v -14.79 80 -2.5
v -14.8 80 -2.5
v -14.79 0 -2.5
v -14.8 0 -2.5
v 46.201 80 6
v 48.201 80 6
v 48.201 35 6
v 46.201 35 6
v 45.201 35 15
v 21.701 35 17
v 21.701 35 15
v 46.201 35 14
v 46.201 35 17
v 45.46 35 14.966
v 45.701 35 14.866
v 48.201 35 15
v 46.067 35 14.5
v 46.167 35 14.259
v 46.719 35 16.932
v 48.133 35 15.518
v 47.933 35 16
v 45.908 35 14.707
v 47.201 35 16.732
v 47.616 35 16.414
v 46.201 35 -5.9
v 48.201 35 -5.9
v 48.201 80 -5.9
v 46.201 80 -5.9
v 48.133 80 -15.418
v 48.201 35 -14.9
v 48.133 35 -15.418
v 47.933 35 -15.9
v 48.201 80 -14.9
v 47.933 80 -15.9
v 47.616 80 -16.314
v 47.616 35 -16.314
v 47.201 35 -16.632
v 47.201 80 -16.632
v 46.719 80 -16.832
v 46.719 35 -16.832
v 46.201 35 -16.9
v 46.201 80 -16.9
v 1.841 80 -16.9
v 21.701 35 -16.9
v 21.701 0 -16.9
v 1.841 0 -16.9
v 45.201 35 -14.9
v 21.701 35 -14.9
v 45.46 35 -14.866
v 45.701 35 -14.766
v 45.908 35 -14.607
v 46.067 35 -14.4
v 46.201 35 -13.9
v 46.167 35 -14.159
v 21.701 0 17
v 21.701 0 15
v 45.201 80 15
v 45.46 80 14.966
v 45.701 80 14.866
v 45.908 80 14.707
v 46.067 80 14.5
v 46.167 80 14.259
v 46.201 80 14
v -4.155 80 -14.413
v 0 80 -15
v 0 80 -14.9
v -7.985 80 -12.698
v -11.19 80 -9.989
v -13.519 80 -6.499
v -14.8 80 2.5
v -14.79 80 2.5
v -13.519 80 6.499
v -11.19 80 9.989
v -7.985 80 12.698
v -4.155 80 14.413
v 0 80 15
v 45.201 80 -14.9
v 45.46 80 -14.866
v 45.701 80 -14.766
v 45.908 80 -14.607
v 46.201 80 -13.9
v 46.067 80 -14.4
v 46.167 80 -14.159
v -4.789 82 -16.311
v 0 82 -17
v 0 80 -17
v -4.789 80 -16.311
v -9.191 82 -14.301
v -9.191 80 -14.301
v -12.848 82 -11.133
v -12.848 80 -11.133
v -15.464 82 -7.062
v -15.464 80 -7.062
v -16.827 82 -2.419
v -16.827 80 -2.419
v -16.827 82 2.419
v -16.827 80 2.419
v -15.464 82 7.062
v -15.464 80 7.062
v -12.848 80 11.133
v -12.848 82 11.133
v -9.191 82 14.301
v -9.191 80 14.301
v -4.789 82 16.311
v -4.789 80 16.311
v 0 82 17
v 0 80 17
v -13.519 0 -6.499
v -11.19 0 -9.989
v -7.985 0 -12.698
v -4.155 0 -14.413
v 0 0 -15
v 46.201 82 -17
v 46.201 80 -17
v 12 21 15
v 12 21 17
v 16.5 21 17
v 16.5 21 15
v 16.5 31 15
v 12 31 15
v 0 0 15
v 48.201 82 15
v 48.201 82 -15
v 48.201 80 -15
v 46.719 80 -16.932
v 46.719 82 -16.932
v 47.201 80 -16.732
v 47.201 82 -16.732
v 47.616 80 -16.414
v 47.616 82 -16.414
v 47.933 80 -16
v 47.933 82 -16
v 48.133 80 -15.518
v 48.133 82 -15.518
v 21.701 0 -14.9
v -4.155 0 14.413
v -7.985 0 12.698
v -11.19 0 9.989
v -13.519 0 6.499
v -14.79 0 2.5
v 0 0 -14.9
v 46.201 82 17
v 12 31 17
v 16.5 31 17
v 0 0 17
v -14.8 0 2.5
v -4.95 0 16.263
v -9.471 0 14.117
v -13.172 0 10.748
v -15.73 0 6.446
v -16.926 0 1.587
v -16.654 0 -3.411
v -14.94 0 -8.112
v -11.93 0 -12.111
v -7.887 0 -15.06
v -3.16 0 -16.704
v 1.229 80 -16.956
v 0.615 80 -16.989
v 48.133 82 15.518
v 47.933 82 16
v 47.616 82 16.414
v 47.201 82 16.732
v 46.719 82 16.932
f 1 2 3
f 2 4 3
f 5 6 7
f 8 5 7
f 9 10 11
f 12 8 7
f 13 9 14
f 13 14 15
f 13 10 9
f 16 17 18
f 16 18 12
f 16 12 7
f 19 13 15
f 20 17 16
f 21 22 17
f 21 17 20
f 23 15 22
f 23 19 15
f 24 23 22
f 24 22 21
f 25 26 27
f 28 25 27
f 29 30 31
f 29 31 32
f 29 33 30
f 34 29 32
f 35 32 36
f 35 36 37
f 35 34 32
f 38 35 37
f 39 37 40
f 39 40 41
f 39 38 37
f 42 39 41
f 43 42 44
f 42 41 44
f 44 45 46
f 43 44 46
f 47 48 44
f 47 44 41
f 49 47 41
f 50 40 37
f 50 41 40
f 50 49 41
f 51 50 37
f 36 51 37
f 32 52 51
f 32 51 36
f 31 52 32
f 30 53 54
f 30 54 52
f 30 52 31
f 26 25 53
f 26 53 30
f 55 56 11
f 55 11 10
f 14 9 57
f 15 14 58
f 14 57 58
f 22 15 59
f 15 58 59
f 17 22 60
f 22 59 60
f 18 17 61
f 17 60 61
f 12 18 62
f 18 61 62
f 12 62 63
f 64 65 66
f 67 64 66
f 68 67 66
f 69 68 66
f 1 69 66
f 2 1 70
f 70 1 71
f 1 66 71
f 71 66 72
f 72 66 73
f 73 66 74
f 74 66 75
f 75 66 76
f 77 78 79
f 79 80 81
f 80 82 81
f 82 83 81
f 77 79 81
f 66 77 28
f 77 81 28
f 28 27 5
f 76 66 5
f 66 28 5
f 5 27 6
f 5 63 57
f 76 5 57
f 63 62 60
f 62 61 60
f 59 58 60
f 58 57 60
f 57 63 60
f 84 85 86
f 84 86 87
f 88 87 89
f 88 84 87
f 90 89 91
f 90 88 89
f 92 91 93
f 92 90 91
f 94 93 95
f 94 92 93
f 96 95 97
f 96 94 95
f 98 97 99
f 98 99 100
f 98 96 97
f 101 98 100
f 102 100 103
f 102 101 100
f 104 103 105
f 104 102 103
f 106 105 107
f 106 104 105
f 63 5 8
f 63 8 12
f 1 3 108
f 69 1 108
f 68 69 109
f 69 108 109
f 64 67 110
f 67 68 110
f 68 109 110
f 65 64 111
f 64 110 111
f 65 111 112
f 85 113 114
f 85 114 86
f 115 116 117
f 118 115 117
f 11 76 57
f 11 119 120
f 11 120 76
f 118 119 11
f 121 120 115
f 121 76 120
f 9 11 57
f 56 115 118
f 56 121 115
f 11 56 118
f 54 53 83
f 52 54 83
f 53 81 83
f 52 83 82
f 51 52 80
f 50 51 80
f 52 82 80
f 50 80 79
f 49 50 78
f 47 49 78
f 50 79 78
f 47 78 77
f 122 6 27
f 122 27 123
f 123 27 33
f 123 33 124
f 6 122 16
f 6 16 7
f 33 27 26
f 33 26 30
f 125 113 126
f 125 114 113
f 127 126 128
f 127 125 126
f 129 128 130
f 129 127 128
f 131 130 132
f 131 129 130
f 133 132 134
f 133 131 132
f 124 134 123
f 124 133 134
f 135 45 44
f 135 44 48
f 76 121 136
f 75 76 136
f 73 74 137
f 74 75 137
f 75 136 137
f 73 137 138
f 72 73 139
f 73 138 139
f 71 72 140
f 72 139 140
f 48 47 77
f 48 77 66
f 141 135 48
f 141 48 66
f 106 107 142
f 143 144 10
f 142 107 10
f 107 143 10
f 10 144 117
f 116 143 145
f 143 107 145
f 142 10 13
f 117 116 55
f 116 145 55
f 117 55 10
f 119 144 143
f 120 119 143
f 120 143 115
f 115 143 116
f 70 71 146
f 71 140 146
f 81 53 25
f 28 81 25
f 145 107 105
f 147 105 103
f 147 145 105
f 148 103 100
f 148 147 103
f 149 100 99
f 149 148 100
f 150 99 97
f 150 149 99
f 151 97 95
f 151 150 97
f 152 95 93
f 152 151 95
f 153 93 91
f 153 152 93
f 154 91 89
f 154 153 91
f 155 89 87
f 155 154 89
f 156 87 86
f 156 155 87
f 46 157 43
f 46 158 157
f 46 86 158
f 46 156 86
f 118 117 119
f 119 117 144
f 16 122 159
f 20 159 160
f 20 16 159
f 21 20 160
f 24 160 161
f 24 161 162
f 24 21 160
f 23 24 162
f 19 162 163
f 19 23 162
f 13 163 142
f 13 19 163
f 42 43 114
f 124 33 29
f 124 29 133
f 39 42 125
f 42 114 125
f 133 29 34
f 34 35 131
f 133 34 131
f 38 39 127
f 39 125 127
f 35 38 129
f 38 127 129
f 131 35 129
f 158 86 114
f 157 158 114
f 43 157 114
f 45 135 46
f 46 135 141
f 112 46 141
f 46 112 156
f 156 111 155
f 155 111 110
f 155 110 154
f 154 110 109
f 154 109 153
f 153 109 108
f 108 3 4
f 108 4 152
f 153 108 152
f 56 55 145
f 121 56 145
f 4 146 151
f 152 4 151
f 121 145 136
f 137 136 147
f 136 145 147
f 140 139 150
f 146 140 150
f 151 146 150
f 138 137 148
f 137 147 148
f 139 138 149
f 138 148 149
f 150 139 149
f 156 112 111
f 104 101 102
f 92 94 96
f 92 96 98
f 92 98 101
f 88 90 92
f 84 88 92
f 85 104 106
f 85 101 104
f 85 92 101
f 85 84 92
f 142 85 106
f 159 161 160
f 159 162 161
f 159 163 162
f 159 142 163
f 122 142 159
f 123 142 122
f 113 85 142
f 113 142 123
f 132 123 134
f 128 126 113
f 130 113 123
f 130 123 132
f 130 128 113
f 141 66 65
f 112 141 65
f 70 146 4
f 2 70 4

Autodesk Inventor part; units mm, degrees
ref_plane "YZ Plane" through (0, 0, 0) normal (1, 0, 0) x (0, 1, 0)
ref_plane "XZ Plane" through (0, 0, 0) normal (0, 1, 0) x (-1, 0, 0)
sketch "Sketch1" plane through (0, 0, 0) normal (0, 1, 0) x (-1, 0, 0)
  line L0 (-15.6488, -14.9) -> (-4.1777, -14.9)
  line L1 (-4.1777, 15) -> (-13.2013, 15)
  line L2 (14.7902, 2.5) -> (14.8, 2.5)
  line L3 (14.8, 2.5) -> (14.8, -2.5)
  line L4 (14.8, -2.5) -> (14.7902, -2.5)
  arc A0 (0, -15) -> (14.7902, -2.5) centre (0, 0) ccw
  arc A1 (14.7902, 2.5) -> (0, 15) centre (0, 0) ccw
  line L5 (0.0236, 15) -> (0.0236, 15.0064)
  line L6 (0.0236, 15) -> (-4.1777, 15)
  line L7 (-4.1777, 15) -> (-4.1777, 15)
  line L8 (-0.1777, -14.9) -> (-4.1777, -14.9)
  line L9 (-4.1777, -14.9) -> (0, -14.9)
  line L10 (-4.1777, -14.9) -> (-4.1777, -14.9)
  line L11 (-13.2013, 15) -> (-46.2013, 15)
  line L12 (-15.6488, -14.9) -> (-46.2013, -14.9)
  line L13 (-46.2013, -14.9) -> (-46.2013, 15)
  arc A2 (-1.8412, -16.9) -> (0, 17) centre (0, 0) ccw
  line L14 (0, 17) -> (-48.2013, 17)
  line L15 (-48.2013, 17) -> (-48.2013, -16.9)
  line L16 (-48.2013, -16.9) -> (-1.8412, -16.9)
  line L17 (0.0236, 15) -> (0.0236, 15)
  line L18 (0, -14.9) -> (0, -15)
  point P0 (-13.2013, 0)
  point P1 (12.5, 0)
  point P2 (11.0065, 21.7068)
  point P3 (11.0065, 50.7004)
  dimension "d7" = 33
  dimension "d8" = 2
  dimension "d9" = 2
  dimension "d10" = 2
  dimension "d11" = 2
  dimension "d39" = 15
  dimension "d90" = 33.9
  dimension "d91" = 29.9
  dimension "d92" = 2
  dimension "d93" = 2
  dimension "d94" = 2.2
  dimension "d95" = 14.8
extrude "Extrusion1" add sketch "Sketch1" along normal blind 80
ref_plane "Work Plane1" through (0, 82, 0) normal (0, 1, 0) x (1, 0, 0)
sketch "Sketch3" plane through (0, 82, 0) normal (0, 1, 0) x (1, 0, 0)
  arc A0 (0, 17) -> (0, -17) centre (0, 0) ccw
  line L0 (0, -17) -> (48.2013, -17)
  line L1 (48.2013, -17) -> (48.2013, 17)
  line L2 (48.2013, 17) -> (0, 17)
  point P0 (13.2013, 0)
  point P1 (-14.9845, -166.3883)
  point P2 (-14.9845, -137.3947)
  point P3 (-26.1687, -202.0885)
extrude "Extrusion2" add sketch "Sketch3" against normal up to surface (2 mm away)
sketch "Sketch4" plane through (48.2013, 0, -16.9) normal (0, 0, -1) x (-1, 0, 0)
  point P0 (48.2013, 0)
fillet "Fillet1" radius 2 2 edges at (48.2013, 40, -16.9) (48.2013, 41, 17)
fillet "Fillet2" radius 1 2 edges at (46.2013, 40, 15) (46.2013, 40, -14.9)
fillet "Fillet3" radius 2 1 edges at (48.2013, 81, -17)
sketch "Sketch10" plane through (0, 0, 0) normal (0, -1, 0) x (1, 0, 0)
  line L0 (0, -17) -> (46.2013, -17) projected
  line L1 (23.9488, -17) -> (41.9488, -17)
  line L2 (41.9488, -17) -> (41.9488, -3)
  line L3 (41.9488, -3) -> (23.9488, -3)
  line L4 (23.9488, -3) -> (23.9488, -17)
  point P0 (0, 0)
  dimension "d79" = 14
  dimension "d80" = 18
sketch "Sketch11" plane through (0, 0, 0) normal (0, -1, 0) x (1, 0, 0)
  line L0 (0, 17) -> (46.2013, 17) projected
  line L1 (21.7013, 17) -> (48.2013, 17)
  line L2 (48.2013, 17) -> (48.2013, -16.9)
  line L3 (48.2013, -16.9) -> (21.7013, -16.9)
  line L4 (21.7013, -16.9) -> (21.7013, 17)
  line L5 (48.2013, 15) -> (48.2013, -14.9) projected
  point P0 (0, 0)
  dimension "d86" = 26.5
  dimension "d87" = 0
extrude "Extrusion8" cut sketch "Sketch11" against normal blind 35
sketch "Sketch12" plane through (48.2013, 82, 15) normal (1, 0, 0) x (0, 0, -1)
  line L0 (0, -47) -> (29.9, -47) projected
  line L1 (9, -47) -> (20.9, -47)
  line L2 (20.9, -47) -> (20.9, -2)
  line L3 (20.9, -2) -> (9, -2)
  line L4 (9, -2) -> (9, -47)
  line L5 (29.9, -2) -> (29.9, -47) projected
  line L6 (0, -47) -> (0, 0) projected
  line L7 (0, 0) -> (30, 0) projected
  point P0 (15, -82)
  dimension "d97" = 9
  dimension "d98" = 9
  dimension "d99" = 2
extrude "Extrusion9" cut sketch "Sketch12" against normal up to surface (2 mm away)
sketch "Sketch13" plane through (0, 0, 17) normal (0, 0, 1) x (1, 0, 0)
  line L0 (16.5, 31) -> (12, 31)
  line L1 (12, 31) -> (12, 21)
  line L2 (12, 21) -> (16.5, 21)
  line L3 (16.5, 21) -> (16.5, 31)
  line L4 (0, 0) -> (21.7013, 0) projected
  line L5 (0, 0) -> (0, 82) projected
  line L6 (0, 82) -> (46.2013, 82) projected
  dimension "d103" = 12
  dimension "d107" = 61
  dimension "d108" = 4.5
  dimension "d109" = 10
extrude "Extrusion10" cut sketch "Sketch13" against normal up to surface (2 mm away)
properties part number "schranka"
